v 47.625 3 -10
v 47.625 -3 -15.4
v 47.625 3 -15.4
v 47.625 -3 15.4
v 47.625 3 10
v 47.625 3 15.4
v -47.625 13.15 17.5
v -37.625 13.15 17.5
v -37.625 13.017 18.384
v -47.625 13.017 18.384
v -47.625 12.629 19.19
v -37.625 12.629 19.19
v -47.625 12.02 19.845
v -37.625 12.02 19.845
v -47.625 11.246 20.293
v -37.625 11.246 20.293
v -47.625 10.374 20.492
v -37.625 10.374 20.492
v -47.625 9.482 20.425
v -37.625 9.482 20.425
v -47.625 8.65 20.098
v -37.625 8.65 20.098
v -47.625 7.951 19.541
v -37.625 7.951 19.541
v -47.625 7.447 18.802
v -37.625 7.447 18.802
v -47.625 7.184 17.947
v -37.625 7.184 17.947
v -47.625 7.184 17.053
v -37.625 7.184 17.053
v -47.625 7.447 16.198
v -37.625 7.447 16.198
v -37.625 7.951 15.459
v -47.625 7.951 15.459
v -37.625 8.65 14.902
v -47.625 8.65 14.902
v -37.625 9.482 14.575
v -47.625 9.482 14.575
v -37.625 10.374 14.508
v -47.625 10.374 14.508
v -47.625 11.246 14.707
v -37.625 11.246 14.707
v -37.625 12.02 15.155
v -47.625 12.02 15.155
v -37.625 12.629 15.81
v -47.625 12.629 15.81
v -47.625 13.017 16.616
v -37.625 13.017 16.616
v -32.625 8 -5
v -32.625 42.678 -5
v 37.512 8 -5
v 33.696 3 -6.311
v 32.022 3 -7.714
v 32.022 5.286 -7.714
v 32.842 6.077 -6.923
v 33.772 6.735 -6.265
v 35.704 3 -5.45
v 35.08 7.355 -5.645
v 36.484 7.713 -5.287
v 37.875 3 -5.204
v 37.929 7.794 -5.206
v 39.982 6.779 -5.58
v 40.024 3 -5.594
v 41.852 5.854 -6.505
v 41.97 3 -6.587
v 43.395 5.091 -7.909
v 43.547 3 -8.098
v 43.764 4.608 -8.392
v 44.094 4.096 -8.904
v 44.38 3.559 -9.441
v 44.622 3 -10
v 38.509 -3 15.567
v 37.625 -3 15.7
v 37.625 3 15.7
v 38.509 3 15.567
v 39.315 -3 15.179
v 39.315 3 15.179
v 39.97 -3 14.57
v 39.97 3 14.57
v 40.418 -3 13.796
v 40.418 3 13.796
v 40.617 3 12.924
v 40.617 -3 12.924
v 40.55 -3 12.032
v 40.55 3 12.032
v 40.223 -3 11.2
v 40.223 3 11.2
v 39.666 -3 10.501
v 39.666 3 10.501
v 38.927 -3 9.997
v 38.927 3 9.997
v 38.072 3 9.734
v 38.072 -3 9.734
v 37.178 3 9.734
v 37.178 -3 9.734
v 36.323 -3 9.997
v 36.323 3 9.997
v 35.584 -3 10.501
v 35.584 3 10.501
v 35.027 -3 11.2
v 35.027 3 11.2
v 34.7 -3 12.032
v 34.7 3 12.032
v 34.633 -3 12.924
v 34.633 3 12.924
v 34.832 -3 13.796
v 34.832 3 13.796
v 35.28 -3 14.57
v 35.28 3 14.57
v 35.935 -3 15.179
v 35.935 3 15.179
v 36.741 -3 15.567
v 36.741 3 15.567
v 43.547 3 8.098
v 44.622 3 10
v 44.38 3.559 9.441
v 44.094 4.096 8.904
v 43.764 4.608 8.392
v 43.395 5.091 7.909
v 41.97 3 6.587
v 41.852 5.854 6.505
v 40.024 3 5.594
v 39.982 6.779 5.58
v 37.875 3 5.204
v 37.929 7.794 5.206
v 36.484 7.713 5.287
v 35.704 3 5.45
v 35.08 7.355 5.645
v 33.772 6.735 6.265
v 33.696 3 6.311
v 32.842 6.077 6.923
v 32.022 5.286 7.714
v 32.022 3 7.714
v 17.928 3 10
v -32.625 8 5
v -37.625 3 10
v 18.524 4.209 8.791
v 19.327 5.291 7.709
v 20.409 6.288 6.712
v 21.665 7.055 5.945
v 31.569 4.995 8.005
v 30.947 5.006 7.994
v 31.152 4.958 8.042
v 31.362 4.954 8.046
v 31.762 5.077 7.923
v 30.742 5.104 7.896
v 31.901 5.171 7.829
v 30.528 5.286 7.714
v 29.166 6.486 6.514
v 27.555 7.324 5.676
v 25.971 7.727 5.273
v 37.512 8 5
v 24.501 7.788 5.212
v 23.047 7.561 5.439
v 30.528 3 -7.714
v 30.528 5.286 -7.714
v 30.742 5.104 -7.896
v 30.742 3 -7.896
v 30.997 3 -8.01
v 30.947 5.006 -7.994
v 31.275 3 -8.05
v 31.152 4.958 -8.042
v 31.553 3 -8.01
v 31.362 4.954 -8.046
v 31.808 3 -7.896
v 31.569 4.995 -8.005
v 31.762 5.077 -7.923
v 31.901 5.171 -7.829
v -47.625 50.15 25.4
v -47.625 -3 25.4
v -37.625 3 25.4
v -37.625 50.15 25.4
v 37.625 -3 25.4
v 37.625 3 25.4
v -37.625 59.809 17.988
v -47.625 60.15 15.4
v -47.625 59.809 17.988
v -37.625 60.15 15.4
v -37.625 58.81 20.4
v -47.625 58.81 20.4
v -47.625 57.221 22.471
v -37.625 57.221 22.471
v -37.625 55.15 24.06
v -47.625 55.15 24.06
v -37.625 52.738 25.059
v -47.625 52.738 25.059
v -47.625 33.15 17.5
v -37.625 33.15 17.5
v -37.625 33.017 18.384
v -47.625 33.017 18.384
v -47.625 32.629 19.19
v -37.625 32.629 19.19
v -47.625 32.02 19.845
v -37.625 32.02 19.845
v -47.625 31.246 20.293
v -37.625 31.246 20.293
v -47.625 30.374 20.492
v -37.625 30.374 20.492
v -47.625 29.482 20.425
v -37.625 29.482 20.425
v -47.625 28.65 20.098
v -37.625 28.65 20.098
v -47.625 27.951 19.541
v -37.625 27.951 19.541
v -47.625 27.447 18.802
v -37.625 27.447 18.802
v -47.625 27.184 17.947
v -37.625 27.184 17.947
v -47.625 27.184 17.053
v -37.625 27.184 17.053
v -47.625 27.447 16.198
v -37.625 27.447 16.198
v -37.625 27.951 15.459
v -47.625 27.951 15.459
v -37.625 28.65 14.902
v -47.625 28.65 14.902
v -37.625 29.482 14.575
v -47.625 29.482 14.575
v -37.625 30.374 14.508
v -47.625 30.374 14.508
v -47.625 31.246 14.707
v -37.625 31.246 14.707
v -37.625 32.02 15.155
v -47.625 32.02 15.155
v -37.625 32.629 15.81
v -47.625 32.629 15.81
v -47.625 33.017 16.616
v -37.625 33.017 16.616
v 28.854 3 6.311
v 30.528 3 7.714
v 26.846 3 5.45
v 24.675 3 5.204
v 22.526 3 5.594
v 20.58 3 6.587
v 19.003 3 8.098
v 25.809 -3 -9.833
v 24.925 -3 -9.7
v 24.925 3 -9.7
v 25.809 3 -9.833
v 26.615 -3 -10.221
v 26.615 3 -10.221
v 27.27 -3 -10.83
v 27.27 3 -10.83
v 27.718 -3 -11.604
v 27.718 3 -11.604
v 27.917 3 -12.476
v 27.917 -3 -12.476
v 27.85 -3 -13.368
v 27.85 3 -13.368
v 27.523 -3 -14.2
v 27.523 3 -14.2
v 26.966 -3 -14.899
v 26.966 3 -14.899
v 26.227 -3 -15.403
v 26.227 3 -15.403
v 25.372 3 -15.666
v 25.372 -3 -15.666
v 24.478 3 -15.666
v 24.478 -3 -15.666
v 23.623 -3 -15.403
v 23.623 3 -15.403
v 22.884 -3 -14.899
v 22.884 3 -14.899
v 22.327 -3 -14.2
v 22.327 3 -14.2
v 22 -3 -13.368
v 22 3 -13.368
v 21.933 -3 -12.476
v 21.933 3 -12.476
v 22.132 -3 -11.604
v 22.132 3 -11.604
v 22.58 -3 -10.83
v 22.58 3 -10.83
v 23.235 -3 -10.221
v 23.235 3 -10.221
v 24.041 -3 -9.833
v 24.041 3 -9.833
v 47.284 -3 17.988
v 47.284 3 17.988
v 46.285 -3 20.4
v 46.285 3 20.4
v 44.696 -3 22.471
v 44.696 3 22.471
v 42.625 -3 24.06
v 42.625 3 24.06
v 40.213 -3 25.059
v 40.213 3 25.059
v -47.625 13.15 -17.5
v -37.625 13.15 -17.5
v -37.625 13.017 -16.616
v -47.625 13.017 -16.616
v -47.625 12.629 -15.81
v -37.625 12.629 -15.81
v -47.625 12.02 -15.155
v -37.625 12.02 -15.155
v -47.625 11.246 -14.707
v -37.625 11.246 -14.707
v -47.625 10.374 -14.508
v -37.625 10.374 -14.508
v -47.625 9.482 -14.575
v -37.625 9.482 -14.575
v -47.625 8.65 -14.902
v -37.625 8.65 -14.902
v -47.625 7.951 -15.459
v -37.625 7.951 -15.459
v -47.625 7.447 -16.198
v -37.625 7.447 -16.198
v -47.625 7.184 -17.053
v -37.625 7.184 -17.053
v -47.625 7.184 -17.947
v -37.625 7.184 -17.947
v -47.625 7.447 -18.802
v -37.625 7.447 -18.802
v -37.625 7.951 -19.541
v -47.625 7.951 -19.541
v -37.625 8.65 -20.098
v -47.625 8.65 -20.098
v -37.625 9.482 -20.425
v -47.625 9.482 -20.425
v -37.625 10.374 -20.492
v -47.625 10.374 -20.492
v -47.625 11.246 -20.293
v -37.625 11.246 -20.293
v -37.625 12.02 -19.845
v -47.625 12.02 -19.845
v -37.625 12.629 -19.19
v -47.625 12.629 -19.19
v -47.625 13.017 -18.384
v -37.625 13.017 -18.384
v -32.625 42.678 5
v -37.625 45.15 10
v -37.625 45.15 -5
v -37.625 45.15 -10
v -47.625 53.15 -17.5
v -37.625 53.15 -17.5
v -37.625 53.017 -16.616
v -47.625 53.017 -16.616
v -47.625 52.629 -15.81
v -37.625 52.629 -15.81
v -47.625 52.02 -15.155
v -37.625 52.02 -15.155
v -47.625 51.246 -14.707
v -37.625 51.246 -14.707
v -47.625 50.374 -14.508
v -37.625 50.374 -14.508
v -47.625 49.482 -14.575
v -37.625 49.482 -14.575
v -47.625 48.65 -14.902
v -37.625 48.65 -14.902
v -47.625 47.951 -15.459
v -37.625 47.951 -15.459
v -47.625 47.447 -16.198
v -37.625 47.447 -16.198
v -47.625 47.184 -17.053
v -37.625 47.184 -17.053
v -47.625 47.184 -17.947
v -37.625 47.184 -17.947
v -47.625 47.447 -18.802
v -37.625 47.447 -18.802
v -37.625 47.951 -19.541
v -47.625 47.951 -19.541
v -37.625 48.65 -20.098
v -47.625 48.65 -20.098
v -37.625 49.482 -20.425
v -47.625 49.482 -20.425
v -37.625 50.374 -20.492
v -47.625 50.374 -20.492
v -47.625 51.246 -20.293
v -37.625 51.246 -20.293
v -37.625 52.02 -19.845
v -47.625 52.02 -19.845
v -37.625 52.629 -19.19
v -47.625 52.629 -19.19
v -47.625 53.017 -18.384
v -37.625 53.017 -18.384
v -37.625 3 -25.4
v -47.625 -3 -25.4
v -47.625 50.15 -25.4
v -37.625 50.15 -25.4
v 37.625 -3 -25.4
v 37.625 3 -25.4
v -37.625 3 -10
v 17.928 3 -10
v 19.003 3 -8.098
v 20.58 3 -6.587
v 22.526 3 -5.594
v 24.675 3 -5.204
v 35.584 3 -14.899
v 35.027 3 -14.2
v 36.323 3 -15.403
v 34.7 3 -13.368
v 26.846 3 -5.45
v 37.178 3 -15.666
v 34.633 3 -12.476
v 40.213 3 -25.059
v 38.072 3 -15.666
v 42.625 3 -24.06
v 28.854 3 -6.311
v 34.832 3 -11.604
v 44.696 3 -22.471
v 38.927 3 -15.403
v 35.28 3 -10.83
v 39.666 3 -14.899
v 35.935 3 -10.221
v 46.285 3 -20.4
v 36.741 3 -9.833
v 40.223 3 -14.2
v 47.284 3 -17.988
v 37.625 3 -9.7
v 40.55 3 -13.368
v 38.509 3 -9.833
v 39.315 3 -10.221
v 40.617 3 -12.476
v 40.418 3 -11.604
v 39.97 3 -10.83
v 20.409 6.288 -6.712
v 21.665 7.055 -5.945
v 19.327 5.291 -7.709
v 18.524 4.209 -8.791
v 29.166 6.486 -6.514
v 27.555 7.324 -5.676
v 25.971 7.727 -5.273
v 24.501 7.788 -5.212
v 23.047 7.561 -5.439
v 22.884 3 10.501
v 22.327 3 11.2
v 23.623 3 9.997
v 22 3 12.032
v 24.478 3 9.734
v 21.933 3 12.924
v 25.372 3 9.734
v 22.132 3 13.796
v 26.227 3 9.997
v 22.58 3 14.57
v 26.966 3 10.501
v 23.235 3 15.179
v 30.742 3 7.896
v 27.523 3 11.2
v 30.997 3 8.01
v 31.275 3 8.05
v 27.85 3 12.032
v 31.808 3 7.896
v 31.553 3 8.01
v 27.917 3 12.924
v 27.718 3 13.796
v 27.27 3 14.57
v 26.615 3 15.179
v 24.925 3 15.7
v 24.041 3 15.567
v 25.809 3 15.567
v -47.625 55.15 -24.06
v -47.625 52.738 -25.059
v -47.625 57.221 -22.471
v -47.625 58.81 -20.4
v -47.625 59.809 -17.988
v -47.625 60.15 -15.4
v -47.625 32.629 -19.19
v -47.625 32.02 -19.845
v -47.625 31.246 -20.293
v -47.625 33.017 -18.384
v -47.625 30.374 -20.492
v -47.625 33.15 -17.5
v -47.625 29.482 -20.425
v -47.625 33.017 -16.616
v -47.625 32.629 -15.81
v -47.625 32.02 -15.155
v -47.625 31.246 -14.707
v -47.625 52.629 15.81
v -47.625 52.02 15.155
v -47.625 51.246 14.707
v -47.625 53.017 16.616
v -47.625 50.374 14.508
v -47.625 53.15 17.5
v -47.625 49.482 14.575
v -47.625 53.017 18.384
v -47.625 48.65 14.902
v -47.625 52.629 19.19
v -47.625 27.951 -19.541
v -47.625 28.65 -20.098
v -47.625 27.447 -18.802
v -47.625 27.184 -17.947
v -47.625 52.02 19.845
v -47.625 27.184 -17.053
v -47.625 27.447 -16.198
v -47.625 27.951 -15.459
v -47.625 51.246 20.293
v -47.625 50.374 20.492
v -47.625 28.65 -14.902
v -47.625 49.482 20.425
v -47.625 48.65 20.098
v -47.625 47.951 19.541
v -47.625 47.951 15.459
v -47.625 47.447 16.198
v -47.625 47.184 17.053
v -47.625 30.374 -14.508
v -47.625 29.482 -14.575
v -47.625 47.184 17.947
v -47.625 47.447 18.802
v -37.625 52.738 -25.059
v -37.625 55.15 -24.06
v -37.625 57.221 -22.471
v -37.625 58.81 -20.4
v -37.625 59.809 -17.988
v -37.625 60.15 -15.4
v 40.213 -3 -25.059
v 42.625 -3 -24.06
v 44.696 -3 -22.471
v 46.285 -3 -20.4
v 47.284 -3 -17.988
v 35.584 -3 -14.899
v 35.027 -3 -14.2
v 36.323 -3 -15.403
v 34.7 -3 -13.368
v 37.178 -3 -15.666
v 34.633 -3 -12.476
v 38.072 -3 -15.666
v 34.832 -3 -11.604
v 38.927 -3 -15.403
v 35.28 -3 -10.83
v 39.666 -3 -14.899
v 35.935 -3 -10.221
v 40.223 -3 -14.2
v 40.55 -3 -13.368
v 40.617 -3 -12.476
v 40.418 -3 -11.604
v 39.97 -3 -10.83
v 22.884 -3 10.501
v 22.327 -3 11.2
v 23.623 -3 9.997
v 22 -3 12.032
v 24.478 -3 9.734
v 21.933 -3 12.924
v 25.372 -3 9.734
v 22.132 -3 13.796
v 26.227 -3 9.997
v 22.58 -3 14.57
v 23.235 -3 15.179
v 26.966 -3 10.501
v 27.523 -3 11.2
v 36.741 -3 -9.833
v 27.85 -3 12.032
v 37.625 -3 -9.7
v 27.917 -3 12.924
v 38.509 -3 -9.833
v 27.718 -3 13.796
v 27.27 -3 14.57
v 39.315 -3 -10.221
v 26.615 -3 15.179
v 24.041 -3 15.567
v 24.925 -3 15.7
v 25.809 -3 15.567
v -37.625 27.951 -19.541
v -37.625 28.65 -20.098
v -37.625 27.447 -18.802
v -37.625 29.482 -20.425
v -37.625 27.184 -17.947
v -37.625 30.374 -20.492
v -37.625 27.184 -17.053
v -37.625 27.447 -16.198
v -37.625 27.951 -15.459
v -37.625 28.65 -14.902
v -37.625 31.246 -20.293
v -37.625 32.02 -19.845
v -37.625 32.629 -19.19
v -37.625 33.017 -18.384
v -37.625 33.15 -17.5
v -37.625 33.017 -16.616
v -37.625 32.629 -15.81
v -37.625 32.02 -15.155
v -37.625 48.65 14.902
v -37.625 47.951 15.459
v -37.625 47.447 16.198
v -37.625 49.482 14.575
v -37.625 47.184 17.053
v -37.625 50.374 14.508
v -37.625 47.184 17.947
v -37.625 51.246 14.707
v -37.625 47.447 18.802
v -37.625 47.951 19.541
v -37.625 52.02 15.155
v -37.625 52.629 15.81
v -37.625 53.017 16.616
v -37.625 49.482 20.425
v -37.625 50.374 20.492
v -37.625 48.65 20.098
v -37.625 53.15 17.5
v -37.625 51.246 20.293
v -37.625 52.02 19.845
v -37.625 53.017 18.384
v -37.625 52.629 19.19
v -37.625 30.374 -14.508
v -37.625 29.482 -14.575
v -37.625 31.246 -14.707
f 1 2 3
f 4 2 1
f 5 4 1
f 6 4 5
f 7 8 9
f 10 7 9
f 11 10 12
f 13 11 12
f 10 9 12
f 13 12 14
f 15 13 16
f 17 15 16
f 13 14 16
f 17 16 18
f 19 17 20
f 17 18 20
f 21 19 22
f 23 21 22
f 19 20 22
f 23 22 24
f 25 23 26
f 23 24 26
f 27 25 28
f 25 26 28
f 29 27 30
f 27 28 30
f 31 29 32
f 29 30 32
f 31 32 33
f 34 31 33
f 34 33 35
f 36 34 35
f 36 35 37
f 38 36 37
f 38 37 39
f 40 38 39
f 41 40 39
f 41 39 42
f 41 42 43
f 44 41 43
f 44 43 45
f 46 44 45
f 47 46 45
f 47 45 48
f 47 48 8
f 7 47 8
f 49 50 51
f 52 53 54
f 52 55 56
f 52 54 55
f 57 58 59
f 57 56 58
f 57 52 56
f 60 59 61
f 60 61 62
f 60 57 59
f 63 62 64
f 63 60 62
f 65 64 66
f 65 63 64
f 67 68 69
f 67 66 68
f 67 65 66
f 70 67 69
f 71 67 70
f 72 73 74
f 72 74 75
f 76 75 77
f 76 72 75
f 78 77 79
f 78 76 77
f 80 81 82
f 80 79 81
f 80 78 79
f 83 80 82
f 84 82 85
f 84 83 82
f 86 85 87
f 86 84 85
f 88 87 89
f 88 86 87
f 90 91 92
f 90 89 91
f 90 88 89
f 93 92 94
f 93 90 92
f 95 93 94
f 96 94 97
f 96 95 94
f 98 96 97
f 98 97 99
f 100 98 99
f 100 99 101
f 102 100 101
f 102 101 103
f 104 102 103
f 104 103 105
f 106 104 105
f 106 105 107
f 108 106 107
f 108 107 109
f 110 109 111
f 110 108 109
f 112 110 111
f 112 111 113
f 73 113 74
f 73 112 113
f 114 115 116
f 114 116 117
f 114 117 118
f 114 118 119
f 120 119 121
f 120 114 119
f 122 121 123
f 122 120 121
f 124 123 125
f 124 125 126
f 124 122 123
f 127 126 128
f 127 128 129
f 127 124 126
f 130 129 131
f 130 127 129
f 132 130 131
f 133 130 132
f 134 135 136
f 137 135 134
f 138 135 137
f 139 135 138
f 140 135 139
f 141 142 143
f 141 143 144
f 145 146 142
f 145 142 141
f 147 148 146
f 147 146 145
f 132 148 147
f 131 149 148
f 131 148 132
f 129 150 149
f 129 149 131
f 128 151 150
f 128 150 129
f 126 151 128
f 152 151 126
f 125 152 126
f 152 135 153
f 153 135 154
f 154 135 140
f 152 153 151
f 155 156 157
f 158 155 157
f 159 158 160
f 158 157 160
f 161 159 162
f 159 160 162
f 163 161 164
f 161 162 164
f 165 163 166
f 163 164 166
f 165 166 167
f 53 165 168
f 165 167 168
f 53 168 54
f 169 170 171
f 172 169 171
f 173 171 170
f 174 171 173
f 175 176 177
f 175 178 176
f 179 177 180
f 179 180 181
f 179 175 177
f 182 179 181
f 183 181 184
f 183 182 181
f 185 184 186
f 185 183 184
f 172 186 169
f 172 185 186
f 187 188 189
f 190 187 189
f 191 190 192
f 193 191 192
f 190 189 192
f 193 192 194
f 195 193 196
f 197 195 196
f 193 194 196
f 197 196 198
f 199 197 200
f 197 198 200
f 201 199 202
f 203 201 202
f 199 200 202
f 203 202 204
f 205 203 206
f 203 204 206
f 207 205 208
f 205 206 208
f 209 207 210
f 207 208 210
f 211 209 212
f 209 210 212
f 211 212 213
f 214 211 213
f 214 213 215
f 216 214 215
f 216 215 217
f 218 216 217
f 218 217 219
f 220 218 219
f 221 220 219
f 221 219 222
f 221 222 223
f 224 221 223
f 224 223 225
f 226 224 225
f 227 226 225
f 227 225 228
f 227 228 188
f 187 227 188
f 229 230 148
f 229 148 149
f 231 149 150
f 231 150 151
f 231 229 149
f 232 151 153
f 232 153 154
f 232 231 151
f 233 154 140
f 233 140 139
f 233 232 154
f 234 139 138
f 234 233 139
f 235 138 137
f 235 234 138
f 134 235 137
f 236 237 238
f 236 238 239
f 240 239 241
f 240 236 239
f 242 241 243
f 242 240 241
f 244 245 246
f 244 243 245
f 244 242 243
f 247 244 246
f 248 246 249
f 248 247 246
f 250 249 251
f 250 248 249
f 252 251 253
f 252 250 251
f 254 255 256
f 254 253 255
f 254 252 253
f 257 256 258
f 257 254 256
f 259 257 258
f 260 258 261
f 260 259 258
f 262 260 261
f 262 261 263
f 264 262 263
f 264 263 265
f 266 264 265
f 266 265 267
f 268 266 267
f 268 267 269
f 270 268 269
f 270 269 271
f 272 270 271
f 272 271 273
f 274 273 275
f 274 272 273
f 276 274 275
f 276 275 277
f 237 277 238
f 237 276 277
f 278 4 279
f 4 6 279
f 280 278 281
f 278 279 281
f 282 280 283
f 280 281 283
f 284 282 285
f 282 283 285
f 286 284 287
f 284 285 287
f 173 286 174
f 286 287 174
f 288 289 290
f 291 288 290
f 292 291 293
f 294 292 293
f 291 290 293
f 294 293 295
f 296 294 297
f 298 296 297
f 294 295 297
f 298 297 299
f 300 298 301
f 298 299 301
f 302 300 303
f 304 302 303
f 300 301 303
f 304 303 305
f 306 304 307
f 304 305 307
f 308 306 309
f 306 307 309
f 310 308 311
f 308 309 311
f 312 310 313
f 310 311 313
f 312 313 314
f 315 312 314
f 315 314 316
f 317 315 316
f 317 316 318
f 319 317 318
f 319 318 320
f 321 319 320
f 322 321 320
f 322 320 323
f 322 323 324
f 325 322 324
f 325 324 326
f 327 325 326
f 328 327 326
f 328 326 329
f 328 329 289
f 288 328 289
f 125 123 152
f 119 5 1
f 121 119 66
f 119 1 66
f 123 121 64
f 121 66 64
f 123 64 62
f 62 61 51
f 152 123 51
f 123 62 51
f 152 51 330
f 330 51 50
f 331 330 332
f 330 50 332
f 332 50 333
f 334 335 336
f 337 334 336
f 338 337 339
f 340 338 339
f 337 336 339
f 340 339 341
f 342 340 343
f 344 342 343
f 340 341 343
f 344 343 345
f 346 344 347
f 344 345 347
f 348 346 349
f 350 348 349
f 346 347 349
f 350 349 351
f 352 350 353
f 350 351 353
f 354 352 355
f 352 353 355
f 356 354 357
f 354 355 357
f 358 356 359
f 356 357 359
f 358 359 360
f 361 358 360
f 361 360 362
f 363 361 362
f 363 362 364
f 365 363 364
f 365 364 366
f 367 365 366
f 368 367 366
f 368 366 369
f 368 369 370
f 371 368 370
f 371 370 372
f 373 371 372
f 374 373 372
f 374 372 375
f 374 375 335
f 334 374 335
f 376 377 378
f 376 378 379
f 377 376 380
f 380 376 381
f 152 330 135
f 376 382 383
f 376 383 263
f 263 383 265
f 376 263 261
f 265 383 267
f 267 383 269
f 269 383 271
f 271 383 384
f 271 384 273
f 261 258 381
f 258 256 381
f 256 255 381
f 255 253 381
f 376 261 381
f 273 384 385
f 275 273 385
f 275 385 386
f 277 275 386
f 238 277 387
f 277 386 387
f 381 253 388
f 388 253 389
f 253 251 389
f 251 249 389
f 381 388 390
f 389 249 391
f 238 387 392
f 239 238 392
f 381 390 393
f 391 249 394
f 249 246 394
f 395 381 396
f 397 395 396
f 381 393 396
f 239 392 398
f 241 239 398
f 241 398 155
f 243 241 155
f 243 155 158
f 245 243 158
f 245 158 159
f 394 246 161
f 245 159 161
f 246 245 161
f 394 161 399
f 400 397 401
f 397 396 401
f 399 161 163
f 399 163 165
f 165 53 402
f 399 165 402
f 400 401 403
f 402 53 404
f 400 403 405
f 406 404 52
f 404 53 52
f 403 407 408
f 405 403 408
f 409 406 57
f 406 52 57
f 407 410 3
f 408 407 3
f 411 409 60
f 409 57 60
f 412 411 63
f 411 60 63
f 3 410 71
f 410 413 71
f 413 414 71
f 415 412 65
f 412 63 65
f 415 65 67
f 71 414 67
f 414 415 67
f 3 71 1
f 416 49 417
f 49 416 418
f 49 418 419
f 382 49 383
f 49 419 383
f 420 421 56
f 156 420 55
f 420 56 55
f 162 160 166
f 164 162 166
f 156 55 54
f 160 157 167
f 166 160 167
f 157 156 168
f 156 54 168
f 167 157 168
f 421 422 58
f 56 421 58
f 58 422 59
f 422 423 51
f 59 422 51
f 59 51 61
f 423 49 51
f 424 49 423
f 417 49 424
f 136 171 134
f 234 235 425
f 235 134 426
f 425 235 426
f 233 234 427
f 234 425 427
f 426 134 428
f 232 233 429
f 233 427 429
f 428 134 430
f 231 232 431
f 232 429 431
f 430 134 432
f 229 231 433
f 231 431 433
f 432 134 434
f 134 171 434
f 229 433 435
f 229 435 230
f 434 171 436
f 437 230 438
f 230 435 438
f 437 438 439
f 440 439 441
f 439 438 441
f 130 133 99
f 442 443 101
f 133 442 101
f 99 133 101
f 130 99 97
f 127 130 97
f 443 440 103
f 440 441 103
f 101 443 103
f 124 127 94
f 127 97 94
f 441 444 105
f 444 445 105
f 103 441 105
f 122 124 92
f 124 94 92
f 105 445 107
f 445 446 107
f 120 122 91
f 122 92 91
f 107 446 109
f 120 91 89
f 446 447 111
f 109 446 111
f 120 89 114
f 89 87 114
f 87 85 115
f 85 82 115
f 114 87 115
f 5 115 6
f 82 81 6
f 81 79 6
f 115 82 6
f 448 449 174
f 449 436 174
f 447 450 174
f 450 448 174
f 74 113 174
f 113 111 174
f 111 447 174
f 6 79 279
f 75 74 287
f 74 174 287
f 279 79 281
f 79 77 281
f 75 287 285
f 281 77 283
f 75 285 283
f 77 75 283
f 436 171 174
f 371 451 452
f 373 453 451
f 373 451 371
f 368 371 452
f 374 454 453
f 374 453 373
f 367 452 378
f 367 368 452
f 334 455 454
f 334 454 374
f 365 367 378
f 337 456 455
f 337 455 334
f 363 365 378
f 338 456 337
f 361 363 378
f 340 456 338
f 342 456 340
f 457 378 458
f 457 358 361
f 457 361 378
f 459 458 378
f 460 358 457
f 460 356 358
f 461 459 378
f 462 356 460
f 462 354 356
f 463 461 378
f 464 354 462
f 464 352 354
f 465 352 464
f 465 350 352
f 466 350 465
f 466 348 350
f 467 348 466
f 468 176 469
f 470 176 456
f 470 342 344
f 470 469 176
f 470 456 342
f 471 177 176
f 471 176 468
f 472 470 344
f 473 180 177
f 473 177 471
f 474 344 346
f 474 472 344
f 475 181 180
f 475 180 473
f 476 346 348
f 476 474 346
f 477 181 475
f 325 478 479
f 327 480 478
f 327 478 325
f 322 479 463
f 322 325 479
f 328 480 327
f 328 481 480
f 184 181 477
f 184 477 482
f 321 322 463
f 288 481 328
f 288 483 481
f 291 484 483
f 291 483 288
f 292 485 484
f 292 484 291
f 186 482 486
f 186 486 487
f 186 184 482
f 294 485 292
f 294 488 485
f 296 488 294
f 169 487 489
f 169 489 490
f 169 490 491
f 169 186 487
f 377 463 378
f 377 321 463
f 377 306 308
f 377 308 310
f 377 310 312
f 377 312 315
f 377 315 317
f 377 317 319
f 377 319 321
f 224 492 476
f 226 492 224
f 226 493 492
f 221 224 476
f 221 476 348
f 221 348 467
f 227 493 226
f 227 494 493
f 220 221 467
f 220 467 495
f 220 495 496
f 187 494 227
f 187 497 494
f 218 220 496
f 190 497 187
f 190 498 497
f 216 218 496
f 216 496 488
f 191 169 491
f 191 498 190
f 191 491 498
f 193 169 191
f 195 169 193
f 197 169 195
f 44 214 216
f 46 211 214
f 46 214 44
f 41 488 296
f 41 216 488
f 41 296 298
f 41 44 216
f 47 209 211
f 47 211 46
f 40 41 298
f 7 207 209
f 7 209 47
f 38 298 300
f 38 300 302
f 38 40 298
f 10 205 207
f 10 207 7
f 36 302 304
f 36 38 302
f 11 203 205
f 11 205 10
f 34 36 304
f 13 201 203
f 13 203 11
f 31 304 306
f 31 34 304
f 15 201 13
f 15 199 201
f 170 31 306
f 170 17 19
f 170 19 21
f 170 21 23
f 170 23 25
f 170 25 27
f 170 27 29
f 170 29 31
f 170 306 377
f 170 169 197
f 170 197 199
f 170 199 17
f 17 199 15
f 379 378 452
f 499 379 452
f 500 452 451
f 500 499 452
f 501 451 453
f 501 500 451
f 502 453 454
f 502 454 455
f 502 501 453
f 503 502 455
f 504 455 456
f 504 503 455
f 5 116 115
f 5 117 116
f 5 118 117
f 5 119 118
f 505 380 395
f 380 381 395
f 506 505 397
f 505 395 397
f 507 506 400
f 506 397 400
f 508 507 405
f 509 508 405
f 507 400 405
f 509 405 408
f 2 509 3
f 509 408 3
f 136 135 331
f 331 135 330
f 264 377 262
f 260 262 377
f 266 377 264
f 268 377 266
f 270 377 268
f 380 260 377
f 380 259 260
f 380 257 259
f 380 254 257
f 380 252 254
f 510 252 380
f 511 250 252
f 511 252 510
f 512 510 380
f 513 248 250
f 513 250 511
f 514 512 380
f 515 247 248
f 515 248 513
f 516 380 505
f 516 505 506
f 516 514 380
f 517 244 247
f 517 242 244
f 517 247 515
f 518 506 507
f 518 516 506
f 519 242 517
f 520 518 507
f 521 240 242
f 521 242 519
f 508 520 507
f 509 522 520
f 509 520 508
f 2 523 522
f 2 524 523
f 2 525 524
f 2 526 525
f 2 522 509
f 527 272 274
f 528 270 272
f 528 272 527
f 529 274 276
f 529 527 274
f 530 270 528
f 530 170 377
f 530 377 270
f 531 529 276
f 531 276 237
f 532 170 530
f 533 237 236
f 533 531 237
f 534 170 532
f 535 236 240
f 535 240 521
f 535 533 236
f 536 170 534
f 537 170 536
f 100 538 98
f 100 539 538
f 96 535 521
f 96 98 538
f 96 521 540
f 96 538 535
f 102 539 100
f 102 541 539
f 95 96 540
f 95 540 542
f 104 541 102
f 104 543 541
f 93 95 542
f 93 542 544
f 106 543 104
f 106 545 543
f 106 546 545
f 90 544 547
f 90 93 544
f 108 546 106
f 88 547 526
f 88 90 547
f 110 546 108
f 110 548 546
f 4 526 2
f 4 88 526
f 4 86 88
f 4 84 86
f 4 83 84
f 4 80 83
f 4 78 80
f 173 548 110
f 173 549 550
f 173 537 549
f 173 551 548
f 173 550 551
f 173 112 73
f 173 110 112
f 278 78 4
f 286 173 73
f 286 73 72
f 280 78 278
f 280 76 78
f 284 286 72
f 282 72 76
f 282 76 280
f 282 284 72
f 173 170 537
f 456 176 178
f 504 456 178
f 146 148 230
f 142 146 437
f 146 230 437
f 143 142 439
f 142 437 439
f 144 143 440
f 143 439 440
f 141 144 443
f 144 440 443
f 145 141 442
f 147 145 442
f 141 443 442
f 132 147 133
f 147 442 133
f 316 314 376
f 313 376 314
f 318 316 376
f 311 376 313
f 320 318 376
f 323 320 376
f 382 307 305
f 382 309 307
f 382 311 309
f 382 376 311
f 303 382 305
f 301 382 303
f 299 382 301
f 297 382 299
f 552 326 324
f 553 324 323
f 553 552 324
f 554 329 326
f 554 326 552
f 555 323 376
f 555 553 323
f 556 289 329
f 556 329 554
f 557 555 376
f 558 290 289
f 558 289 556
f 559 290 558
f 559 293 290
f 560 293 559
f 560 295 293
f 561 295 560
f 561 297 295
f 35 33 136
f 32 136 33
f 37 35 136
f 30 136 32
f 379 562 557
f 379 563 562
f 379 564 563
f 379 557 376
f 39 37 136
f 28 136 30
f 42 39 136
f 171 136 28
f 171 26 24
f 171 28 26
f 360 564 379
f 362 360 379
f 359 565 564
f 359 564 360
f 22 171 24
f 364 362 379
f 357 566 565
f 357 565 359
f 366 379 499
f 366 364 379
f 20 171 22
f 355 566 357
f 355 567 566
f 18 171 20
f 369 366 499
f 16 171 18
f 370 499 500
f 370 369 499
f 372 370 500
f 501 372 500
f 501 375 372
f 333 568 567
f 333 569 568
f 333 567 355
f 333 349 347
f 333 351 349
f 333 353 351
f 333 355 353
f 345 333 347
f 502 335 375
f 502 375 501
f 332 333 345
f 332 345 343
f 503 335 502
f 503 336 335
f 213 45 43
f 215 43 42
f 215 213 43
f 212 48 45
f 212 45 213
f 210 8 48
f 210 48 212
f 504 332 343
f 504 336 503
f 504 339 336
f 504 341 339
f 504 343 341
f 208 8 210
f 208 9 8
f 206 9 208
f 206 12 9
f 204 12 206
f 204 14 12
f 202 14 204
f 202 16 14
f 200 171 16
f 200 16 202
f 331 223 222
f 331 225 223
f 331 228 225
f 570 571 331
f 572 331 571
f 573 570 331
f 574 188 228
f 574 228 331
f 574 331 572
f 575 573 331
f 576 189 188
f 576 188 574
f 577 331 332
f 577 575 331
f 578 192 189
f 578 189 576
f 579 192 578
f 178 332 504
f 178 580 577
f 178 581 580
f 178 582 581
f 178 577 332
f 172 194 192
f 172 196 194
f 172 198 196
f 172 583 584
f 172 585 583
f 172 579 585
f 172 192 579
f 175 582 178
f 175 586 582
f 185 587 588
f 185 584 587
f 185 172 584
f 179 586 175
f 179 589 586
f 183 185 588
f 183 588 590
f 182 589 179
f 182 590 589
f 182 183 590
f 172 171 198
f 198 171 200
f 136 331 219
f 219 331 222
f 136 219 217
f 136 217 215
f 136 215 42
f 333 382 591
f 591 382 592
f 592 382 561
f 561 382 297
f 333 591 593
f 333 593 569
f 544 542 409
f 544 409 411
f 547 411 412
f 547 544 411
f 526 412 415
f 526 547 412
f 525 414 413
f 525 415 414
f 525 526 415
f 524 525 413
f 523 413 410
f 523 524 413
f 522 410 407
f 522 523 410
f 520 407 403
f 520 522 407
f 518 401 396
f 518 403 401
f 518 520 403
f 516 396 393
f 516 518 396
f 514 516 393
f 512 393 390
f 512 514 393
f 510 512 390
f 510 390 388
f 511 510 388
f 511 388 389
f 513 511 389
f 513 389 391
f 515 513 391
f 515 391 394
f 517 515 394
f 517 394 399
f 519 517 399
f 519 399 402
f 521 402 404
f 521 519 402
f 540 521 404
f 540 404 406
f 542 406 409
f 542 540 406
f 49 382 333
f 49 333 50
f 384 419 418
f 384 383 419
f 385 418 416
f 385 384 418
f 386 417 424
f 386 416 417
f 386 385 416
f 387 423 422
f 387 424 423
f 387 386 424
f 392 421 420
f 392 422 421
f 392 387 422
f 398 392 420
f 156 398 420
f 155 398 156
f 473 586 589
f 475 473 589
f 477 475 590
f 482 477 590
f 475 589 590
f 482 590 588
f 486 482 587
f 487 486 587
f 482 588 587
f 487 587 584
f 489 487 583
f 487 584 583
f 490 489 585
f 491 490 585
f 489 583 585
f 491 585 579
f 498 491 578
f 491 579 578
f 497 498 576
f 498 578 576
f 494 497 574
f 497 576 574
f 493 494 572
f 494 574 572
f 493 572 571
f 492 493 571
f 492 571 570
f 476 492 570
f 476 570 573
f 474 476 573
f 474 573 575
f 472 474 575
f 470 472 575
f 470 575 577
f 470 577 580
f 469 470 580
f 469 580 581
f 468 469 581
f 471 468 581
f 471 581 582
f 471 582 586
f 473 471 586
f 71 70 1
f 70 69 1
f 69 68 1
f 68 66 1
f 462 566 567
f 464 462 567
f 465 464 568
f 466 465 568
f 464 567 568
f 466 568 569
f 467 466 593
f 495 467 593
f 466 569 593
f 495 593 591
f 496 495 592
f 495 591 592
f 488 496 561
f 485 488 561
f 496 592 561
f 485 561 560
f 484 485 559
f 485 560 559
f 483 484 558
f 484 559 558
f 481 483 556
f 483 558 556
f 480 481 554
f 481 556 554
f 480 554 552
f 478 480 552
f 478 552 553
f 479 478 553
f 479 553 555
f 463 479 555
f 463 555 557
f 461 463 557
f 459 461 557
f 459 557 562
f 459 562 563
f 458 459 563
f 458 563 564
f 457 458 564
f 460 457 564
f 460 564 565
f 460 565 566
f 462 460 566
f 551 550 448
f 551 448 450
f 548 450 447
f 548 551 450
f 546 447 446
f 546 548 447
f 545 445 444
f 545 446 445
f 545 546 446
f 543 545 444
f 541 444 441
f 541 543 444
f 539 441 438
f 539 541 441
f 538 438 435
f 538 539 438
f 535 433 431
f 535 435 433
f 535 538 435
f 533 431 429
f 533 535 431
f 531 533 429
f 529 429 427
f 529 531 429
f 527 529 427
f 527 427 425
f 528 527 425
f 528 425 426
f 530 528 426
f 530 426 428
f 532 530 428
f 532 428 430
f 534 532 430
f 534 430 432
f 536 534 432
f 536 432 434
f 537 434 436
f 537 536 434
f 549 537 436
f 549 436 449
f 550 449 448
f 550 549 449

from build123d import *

# Parameters (mm, degrees)
SKETCH1_W               = 10
SKETCH1_H               = 57.15
SKETCH1_W_2             = 95.25
SKETCH1_H_2             = 6
BOSS_EXTRUDE1_DEPTH     = 25.4
RIB1_REACH              = 82.817
SKETCH2_WALL_W          = 258.734123662
SKETCH2_WALL_H          = 10
CHAMFER2_SIZE           = 5
CHAMFER3_SIZE           = 5
CUT_EXTRUDE1_DEPTH      = 79.60930686
CUT_EXTRUDE1_DEPTH_BACK = 79.60930686
SKETCH3_R               = 3
SKETCH4_R               = 7.5
CUT_EXTRUDE2_DEPTH      = 79.60930686
FILLET1_R               = 10
FILLET2_R               = 10
CUT_EXTRUDE3_REACH      = 109.381
SKETCH5_R               = 3
FILLET3_R               = 1


with BuildPart() as part:
    # Sketch1 → Boss-Extrude1 (new, symmetric)
    with BuildSketch(Plane.XY):
        with Locations((-42.625, 31.575)):
            Rectangle(SKETCH1_W, SKETCH1_H)
        Rectangle(SKETCH1_W_2, SKETCH1_H_2)
    extrude(amount=BOSS_EXTRUDE1_DEPTH, both=True)

    # Sketch2 wall → Rib1 (add, up to next)
    with BuildSketch(Plane(origin=(5, 24.075, 0), x_dir=(0.896416143278, -0.443213377586, 0), z_dir=(0.443213377586, 0.896416143278, 0)), mode=Mode.PRIVATE) as rib1_sk1:
        Rectangle(SKETCH2_WALL_W, SKETCH2_WALL_H)
    rib1_tool1 = extrude(rib1_sk1.sketch, amount=-RIB1_REACH, mode=Mode.PRIVATE) - part.part
    add(rib1_tool1.solids().sort_by_distance((5, 24.075, 0))[0])

    # Chamfer2
    chamfer2_edges = [part.edges().sort_by_distance(p)[0] for p in [
        (-37.625, 24.075, 5),
        (5, 3, 5),
    ]]
    chamfer(chamfer2_edges, length=CHAMFER2_SIZE)

    # Chamfer3
    # the kernel refuses this chamfer: 5 mm, written as the material it adds along each edge
    with BuildSketch(Plane(origin=(-37.625, 58.00841494, -5), x_dir=(-0.027495876610586317, 0, -0.9996219169112968), z_dir=(0, -1, 0))) as chamfer3_piece_1_section:
        Polygon((CHAMFER3_SIZE * 0.999621916911, CHAMFER3_SIZE * 0.0274958766106), (-CHAMFER3_SIZE * 0.0274958766106, CHAMFER3_SIZE * 0.999621916911), (0, 0), align=None)
    chamfer3_piece_1 = extrude(amount=55.00841494, mode=Mode.PRIVATE)
    chamfer3_piece_1 = split(chamfer3_piece_1, bisect_by=Plane(origin=(-27.763842546, 40.274366139, -6.674975075), z_dir=(-0.4432133775858684, -0.8964161432777338, 0)), keep=Keep.TOP, mode=Mode.PRIVATE)
    add(chamfer3_piece_1)
    with BuildSketch(Plane(origin=(60.48341494, 3, -5), x_dir=(0, 0.9996219169112968, 0.027495876610586244), z_dir=(-1, 0, 0))) as chamfer3_piece_2_section:
        Polygon((CHAMFER3_SIZE * 0.999621916911, CHAMFER3_SIZE * 0.0274958766106), (-CHAMFER3_SIZE * 0.0274958766106, CHAMFER3_SIZE * 0.999621916911), (0, 0), align=None)
    chamfer3_piece_2 = extrude(amount=110.96682988, mode=Mode.PRIVATE)
    chamfer3_piece_2 = split(chamfer3_piece_2, bisect_by=Plane(origin=(-47.625, 4.632358995, -6.683820502), z_dir=(1, 0, 0)), keep=Keep.TOP, mode=Mode.PRIVATE)
    chamfer3_piece_2 = split(chamfer3_piece_2, bisect_by=Plane(origin=(11.398148356, 20.911575329, -6.683820502), z_dir=(-0.4432133775858684, -0.8964161432777338, 0)), keep=Keep.TOP, mode=Mode.PRIVATE)
    add(chamfer3_piece_2)

    # Sketch3 → Cut-Extrude1 (cut, two sides: drawn at the far end of the back side and taken through both)
    with BuildSketch(Plane(origin=(0, 3, 0), x_dir=(1, 0, 0), z_dir=(0, 1, 0)).offset(-CUT_EXTRUDE1_DEPTH_BACK)):
        with Locations(Location((24.925, 12.7, 0), (0, 0, 270))):
            Circle(SKETCH3_R)
        with Locations(Location((24.925, -12.7, 0), (0, 0, 270))):
            Circle(SKETCH3_R)
        with Locations(Location((37.625, -12.7, 0), (0, 0, 270))):
            Circle(SKETCH3_R)
        with Locations(Location((37.625, 12.7, 0), (0, 0, 270))):
            Circle(SKETCH3_R)
    extrude(amount=CUT_EXTRUDE1_DEPTH + CUT_EXTRUDE1_DEPTH_BACK, mode=Mode.SUBTRACT)

    # Sketch4 → Cut-Extrude2 (cut, through all)
    with BuildSketch(Plane(origin=(0, 3, 0), x_dir=(1, 0, 0), z_dir=(0, 1, 0))):
        with BuildLine():
            ThreePointArc((31.275, -16.690927211), (39.701655966, -19.906767653), (45.125, -12.7))
            ThreePointArc((45.125, -12.7), (44.998213921, -11.326786079), (44.622142274, -10))
            Line((44.622142274, -10), (38.932669683, -10))
            ThreePointArc((38.932669683, -10), (37.625, -15.7), (36.317330317, -10))
            Line((36.317330317, -10), (31.922142274, -10))
            ThreePointArc((31.922142274, -10), (32.298213921, -11.326786079), (32.425, -12.7))
            ThreePointArc((32.425, -12.7), (32.131767653, -14.776655966), (31.275, -16.690927211))
        make_face()
        with BuildLine():
            Line((38.932669683, -10), (44.622142274, -10))
            ThreePointArc((44.622142274, -10), (38.347026001, -5.234835671), (31.275, -8.709072789))
            ThreePointArc((31.275, -8.709072789), (31.629712894, -9.338925021), (31.922142274, -10))
            Line((31.922142274, -10), (36.317330317, -10))
            ThreePointArc((36.317330317, -10), (37.625, -15.7), (38.932669683, -10))
        make_face()
        with BuildLine():
            ThreePointArc((17.927857726, -10), (21.563925021, -19.404712894), (31.275, -16.690927211))
            ThreePointArc((31.275, -16.690927211), (30.159835671, -13.422026001), (30.627857726, -10))
            Line((30.627857726, -10), (26.232669683, -10))
            ThreePointArc((26.232669683, -10), (24.925, -15.7), (23.617330317, -10))
            Line((23.617330317, -10), (17.927857726, -10))
        make_face()
        with BuildLine():
            ThreePointArc((30.627857726, -10), (30.920287106, -9.338925021), (31.275, -8.709072789))
            ThreePointArc((31.275, -8.709072789), (24.202973999, -5.234835671), (17.927857726, -10))
            Line((17.927857726, -10), (23.617330317, -10))
            ThreePointArc((23.617330317, -10), (24.925, -15.7), (26.232669683, -10))
            Line((26.232669683, -10), (30.627857726, -10))
        make_face()
        with BuildLine():
            ThreePointArc((30.627857726, -10), (30.159835671, -13.422026001), (31.275, -16.690927211))
            ThreePointArc((31.275, -16.690927211), (32.131767653, -14.776655966), (32.425, -12.7))
            ThreePointArc((32.425, -12.7), (32.298213921, -11.326786079), (31.922142274, -10))
            Line((31.922142274, -10), (30.627857726, -10))
        make_face()
        with BuildLine():
            ThreePointArc((31.922142274, -10), (31.629712894, -9.338925021), (31.275, -8.709072789))
            ThreePointArc((31.275, -8.709072789), (30.920287106, -9.338925021), (30.627857726, -10))
            Line((30.627857726, -10), (31.922142274, -10))
        make_face()
        with Locations((24.925, 12.7)):
            Circle(SKETCH4_R)
        with Locations((37.625, 12.7)):
            Circle(SKETCH4_R)
    extrude(amount=CUT_EXTRUDE2_DEPTH, mode=Mode.SUBTRACT)

    # Fillet1
    fillet1_edges = [part.edges().sort_by_distance(p)[0] for p in [
        (47.625, 0, 25.4),
        (47.625, 0, -25.4),
    ]]
    fillet(fillet1_edges, radius=FILLET1_R)

    # Fillet2
    fillet2_edges = [part.edges().sort_by_distance(p)[0] for p in [
        (-42.625, 60.15, 25.4),
        (-42.625, 60.15, -25.4),
    ]]
    fillet(fillet2_edges, radius=FILLET2_R)

    # Sketch5 → Cut-Extrude3 (cut, up to next)
    with BuildSketch(Plane(origin=(-37.625, 0, 0), x_dir=(0, 0, -1), z_dir=(1, 0, 0)), mode=Mode.PRIVATE) as cut_extrude3_sk1:
        with Locations(Location((-17.5, 50.15, 0), (0, 0, 90))):
            Circle(SKETCH5_R)
    cut_extrude3_tool1 = extrude(cut_extrude3_sk1.sketch, amount=-CUT_EXTRUDE3_REACH, mode=Mode.PRIVATE) & part.part
    # Sketch5 → Cut-Extrude3 (cut, up to next)
    with BuildSketch(Plane(origin=(-37.625, 0, 0), x_dir=(0, 0, -1), z_dir=(1, 0, 0)), mode=Mode.PRIVATE) as cut_extrude3_sk2:
        with Locations(Location((17.5, 50.15, 0), (0, 0, 90))):
            Circle(SKETCH5_R)
    cut_extrude3_tool2 = extrude(cut_extrude3_sk2.sketch, amount=-CUT_EXTRUDE3_REACH, mode=Mode.PRIVATE) & part.part
    # Sketch5 → Cut-Extrude3 (cut, up to next)
    with BuildSketch(Plane(origin=(-37.625, 0, 0), x_dir=(0, 0, -1), z_dir=(1, 0, 0)), mode=Mode.PRIVATE) as cut_extrude3_sk3:
        with Locations(Location((17.5, 30.15, 0), (0, 0, 90))):
            Circle(SKETCH5_R)
    cut_extrude3_tool3 = extrude(cut_extrude3_sk3.sketch, amount=-CUT_EXTRUDE3_REACH, mode=Mode.PRIVATE) & part.part
    # Sketch5 → Cut-Extrude3 (cut, up to next)
    with BuildSketch(Plane(origin=(-37.625, 0, 0), x_dir=(0, 0, -1), z_dir=(1, 0, 0)), mode=Mode.PRIVATE) as cut_extrude3_sk4:
        with Locations(Location((-17.5, 30.15, 0), (0, 0, 90))):
            Circle(SKETCH5_R)
    cut_extrude3_tool4 = extrude(cut_extrude3_sk4.sketch, amount=-CUT_EXTRUDE3_REACH, mode=Mode.PRIVATE) & part.part
    # Sketch5 → Cut-Extrude3 (cut, up to next)
    with BuildSketch(Plane(origin=(-37.625, 0, 0), x_dir=(0, 0, -1), z_dir=(1, 0, 0)), mode=Mode.PRIVATE) as cut_extrude3_sk5:
        with Locations(Location((-17.5, 10.15, 0), (0, 0, 90))):
            Circle(SKETCH5_R)
    cut_extrude3_tool5 = extrude(cut_extrude3_sk5.sketch, amount=-CUT_EXTRUDE3_REACH, mode=Mode.PRIVATE) & part.part
    # Sketch5 → Cut-Extrude3 (cut, up to next)
    with BuildSketch(Plane(origin=(-37.625, 0, 0), x_dir=(0, 0, -1), z_dir=(1, 0, 0)), mode=Mode.PRIVATE) as cut_extrude3_sk6:
        with Locations(Location((17.5, 10.15, 0), (0, 0, 90))):
            Circle(SKETCH5_R)
    cut_extrude3_tool6 = extrude(cut_extrude3_sk6.sketch, amount=-CUT_EXTRUDE3_REACH, mode=Mode.PRIVATE) & part.part
    add(cut_extrude3_tool1.solids().sort_by_distance((-37.625, 50.15, 17.5))[0], mode=Mode.SUBTRACT)
    add(cut_extrude3_tool2.solids().sort_by_distance((-37.625, 50.15, -17.5))[0], mode=Mode.SUBTRACT)
    add(cut_extrude3_tool3.solids().sort_by_distance((-37.625, 30.15, -17.5))[0], mode=Mode.SUBTRACT)
    add(cut_extrude3_tool4.solids().sort_by_distance((-37.625, 30.15, 17.5))[0], mode=Mode.SUBTRACT)
    add(cut_extrude3_tool5.solids().sort_by_distance((-37.625, 10.15, 17.5))[0], mode=Mode.SUBTRACT)
    add(cut_extrude3_tool6.solids().sort_by_distance((-37.625, 10.15, -17.5))[0], mode=Mode.SUBTRACT)

    # Fillet3
    # the kernel refuses this fillet: 1 mm, written as the material it takes off along each edge
    with BuildSketch(Plane(origin=(31.275, 7.401030704, -8.709072789), x_dir=(-0.6005096173498707, 0, 0.7996175332434325), z_dir=(0, -1, 0))) as fillet3_piece_1:
        with BuildLine():
            CenterArc((1.326977491, -0.996554868), FILLET3_R, 94.7573526, 96.67248475)
            ThreePointArc((0.346809381, -1.194722667), (0.198218842, -0.590158172), (0, 0))
            ThreePointArc((0, 0), (0.622020699, -0.025838492), (1.244041397, 0))
        make_face()
    extrude(amount=4.401030704, mode=Mode.SUBTRACT)
    with BuildSketch(Plane(origin=(31.275, 3, 8.709072789), x_dir=(0.6005096173499003, 0, -0.7996175332434102), z_dir=(0, 1, 0))) as fillet3_piece_2:
        with BuildLine():
            CenterArc((1.326977491, 0.996554868), FILLET3_R, 168.570162651, 96.67248475)
            ThreePointArc((0.346809381, 1.194722667), (0.198218842, 0.590158172), (0, 0))
            ThreePointArc((0, 0), (0.622020699, 0.025838492), (1.244041397, 0))
        make_face()
    extrude(amount=4.401030704, mode=Mode.SUBTRACT)


solid = part.part
